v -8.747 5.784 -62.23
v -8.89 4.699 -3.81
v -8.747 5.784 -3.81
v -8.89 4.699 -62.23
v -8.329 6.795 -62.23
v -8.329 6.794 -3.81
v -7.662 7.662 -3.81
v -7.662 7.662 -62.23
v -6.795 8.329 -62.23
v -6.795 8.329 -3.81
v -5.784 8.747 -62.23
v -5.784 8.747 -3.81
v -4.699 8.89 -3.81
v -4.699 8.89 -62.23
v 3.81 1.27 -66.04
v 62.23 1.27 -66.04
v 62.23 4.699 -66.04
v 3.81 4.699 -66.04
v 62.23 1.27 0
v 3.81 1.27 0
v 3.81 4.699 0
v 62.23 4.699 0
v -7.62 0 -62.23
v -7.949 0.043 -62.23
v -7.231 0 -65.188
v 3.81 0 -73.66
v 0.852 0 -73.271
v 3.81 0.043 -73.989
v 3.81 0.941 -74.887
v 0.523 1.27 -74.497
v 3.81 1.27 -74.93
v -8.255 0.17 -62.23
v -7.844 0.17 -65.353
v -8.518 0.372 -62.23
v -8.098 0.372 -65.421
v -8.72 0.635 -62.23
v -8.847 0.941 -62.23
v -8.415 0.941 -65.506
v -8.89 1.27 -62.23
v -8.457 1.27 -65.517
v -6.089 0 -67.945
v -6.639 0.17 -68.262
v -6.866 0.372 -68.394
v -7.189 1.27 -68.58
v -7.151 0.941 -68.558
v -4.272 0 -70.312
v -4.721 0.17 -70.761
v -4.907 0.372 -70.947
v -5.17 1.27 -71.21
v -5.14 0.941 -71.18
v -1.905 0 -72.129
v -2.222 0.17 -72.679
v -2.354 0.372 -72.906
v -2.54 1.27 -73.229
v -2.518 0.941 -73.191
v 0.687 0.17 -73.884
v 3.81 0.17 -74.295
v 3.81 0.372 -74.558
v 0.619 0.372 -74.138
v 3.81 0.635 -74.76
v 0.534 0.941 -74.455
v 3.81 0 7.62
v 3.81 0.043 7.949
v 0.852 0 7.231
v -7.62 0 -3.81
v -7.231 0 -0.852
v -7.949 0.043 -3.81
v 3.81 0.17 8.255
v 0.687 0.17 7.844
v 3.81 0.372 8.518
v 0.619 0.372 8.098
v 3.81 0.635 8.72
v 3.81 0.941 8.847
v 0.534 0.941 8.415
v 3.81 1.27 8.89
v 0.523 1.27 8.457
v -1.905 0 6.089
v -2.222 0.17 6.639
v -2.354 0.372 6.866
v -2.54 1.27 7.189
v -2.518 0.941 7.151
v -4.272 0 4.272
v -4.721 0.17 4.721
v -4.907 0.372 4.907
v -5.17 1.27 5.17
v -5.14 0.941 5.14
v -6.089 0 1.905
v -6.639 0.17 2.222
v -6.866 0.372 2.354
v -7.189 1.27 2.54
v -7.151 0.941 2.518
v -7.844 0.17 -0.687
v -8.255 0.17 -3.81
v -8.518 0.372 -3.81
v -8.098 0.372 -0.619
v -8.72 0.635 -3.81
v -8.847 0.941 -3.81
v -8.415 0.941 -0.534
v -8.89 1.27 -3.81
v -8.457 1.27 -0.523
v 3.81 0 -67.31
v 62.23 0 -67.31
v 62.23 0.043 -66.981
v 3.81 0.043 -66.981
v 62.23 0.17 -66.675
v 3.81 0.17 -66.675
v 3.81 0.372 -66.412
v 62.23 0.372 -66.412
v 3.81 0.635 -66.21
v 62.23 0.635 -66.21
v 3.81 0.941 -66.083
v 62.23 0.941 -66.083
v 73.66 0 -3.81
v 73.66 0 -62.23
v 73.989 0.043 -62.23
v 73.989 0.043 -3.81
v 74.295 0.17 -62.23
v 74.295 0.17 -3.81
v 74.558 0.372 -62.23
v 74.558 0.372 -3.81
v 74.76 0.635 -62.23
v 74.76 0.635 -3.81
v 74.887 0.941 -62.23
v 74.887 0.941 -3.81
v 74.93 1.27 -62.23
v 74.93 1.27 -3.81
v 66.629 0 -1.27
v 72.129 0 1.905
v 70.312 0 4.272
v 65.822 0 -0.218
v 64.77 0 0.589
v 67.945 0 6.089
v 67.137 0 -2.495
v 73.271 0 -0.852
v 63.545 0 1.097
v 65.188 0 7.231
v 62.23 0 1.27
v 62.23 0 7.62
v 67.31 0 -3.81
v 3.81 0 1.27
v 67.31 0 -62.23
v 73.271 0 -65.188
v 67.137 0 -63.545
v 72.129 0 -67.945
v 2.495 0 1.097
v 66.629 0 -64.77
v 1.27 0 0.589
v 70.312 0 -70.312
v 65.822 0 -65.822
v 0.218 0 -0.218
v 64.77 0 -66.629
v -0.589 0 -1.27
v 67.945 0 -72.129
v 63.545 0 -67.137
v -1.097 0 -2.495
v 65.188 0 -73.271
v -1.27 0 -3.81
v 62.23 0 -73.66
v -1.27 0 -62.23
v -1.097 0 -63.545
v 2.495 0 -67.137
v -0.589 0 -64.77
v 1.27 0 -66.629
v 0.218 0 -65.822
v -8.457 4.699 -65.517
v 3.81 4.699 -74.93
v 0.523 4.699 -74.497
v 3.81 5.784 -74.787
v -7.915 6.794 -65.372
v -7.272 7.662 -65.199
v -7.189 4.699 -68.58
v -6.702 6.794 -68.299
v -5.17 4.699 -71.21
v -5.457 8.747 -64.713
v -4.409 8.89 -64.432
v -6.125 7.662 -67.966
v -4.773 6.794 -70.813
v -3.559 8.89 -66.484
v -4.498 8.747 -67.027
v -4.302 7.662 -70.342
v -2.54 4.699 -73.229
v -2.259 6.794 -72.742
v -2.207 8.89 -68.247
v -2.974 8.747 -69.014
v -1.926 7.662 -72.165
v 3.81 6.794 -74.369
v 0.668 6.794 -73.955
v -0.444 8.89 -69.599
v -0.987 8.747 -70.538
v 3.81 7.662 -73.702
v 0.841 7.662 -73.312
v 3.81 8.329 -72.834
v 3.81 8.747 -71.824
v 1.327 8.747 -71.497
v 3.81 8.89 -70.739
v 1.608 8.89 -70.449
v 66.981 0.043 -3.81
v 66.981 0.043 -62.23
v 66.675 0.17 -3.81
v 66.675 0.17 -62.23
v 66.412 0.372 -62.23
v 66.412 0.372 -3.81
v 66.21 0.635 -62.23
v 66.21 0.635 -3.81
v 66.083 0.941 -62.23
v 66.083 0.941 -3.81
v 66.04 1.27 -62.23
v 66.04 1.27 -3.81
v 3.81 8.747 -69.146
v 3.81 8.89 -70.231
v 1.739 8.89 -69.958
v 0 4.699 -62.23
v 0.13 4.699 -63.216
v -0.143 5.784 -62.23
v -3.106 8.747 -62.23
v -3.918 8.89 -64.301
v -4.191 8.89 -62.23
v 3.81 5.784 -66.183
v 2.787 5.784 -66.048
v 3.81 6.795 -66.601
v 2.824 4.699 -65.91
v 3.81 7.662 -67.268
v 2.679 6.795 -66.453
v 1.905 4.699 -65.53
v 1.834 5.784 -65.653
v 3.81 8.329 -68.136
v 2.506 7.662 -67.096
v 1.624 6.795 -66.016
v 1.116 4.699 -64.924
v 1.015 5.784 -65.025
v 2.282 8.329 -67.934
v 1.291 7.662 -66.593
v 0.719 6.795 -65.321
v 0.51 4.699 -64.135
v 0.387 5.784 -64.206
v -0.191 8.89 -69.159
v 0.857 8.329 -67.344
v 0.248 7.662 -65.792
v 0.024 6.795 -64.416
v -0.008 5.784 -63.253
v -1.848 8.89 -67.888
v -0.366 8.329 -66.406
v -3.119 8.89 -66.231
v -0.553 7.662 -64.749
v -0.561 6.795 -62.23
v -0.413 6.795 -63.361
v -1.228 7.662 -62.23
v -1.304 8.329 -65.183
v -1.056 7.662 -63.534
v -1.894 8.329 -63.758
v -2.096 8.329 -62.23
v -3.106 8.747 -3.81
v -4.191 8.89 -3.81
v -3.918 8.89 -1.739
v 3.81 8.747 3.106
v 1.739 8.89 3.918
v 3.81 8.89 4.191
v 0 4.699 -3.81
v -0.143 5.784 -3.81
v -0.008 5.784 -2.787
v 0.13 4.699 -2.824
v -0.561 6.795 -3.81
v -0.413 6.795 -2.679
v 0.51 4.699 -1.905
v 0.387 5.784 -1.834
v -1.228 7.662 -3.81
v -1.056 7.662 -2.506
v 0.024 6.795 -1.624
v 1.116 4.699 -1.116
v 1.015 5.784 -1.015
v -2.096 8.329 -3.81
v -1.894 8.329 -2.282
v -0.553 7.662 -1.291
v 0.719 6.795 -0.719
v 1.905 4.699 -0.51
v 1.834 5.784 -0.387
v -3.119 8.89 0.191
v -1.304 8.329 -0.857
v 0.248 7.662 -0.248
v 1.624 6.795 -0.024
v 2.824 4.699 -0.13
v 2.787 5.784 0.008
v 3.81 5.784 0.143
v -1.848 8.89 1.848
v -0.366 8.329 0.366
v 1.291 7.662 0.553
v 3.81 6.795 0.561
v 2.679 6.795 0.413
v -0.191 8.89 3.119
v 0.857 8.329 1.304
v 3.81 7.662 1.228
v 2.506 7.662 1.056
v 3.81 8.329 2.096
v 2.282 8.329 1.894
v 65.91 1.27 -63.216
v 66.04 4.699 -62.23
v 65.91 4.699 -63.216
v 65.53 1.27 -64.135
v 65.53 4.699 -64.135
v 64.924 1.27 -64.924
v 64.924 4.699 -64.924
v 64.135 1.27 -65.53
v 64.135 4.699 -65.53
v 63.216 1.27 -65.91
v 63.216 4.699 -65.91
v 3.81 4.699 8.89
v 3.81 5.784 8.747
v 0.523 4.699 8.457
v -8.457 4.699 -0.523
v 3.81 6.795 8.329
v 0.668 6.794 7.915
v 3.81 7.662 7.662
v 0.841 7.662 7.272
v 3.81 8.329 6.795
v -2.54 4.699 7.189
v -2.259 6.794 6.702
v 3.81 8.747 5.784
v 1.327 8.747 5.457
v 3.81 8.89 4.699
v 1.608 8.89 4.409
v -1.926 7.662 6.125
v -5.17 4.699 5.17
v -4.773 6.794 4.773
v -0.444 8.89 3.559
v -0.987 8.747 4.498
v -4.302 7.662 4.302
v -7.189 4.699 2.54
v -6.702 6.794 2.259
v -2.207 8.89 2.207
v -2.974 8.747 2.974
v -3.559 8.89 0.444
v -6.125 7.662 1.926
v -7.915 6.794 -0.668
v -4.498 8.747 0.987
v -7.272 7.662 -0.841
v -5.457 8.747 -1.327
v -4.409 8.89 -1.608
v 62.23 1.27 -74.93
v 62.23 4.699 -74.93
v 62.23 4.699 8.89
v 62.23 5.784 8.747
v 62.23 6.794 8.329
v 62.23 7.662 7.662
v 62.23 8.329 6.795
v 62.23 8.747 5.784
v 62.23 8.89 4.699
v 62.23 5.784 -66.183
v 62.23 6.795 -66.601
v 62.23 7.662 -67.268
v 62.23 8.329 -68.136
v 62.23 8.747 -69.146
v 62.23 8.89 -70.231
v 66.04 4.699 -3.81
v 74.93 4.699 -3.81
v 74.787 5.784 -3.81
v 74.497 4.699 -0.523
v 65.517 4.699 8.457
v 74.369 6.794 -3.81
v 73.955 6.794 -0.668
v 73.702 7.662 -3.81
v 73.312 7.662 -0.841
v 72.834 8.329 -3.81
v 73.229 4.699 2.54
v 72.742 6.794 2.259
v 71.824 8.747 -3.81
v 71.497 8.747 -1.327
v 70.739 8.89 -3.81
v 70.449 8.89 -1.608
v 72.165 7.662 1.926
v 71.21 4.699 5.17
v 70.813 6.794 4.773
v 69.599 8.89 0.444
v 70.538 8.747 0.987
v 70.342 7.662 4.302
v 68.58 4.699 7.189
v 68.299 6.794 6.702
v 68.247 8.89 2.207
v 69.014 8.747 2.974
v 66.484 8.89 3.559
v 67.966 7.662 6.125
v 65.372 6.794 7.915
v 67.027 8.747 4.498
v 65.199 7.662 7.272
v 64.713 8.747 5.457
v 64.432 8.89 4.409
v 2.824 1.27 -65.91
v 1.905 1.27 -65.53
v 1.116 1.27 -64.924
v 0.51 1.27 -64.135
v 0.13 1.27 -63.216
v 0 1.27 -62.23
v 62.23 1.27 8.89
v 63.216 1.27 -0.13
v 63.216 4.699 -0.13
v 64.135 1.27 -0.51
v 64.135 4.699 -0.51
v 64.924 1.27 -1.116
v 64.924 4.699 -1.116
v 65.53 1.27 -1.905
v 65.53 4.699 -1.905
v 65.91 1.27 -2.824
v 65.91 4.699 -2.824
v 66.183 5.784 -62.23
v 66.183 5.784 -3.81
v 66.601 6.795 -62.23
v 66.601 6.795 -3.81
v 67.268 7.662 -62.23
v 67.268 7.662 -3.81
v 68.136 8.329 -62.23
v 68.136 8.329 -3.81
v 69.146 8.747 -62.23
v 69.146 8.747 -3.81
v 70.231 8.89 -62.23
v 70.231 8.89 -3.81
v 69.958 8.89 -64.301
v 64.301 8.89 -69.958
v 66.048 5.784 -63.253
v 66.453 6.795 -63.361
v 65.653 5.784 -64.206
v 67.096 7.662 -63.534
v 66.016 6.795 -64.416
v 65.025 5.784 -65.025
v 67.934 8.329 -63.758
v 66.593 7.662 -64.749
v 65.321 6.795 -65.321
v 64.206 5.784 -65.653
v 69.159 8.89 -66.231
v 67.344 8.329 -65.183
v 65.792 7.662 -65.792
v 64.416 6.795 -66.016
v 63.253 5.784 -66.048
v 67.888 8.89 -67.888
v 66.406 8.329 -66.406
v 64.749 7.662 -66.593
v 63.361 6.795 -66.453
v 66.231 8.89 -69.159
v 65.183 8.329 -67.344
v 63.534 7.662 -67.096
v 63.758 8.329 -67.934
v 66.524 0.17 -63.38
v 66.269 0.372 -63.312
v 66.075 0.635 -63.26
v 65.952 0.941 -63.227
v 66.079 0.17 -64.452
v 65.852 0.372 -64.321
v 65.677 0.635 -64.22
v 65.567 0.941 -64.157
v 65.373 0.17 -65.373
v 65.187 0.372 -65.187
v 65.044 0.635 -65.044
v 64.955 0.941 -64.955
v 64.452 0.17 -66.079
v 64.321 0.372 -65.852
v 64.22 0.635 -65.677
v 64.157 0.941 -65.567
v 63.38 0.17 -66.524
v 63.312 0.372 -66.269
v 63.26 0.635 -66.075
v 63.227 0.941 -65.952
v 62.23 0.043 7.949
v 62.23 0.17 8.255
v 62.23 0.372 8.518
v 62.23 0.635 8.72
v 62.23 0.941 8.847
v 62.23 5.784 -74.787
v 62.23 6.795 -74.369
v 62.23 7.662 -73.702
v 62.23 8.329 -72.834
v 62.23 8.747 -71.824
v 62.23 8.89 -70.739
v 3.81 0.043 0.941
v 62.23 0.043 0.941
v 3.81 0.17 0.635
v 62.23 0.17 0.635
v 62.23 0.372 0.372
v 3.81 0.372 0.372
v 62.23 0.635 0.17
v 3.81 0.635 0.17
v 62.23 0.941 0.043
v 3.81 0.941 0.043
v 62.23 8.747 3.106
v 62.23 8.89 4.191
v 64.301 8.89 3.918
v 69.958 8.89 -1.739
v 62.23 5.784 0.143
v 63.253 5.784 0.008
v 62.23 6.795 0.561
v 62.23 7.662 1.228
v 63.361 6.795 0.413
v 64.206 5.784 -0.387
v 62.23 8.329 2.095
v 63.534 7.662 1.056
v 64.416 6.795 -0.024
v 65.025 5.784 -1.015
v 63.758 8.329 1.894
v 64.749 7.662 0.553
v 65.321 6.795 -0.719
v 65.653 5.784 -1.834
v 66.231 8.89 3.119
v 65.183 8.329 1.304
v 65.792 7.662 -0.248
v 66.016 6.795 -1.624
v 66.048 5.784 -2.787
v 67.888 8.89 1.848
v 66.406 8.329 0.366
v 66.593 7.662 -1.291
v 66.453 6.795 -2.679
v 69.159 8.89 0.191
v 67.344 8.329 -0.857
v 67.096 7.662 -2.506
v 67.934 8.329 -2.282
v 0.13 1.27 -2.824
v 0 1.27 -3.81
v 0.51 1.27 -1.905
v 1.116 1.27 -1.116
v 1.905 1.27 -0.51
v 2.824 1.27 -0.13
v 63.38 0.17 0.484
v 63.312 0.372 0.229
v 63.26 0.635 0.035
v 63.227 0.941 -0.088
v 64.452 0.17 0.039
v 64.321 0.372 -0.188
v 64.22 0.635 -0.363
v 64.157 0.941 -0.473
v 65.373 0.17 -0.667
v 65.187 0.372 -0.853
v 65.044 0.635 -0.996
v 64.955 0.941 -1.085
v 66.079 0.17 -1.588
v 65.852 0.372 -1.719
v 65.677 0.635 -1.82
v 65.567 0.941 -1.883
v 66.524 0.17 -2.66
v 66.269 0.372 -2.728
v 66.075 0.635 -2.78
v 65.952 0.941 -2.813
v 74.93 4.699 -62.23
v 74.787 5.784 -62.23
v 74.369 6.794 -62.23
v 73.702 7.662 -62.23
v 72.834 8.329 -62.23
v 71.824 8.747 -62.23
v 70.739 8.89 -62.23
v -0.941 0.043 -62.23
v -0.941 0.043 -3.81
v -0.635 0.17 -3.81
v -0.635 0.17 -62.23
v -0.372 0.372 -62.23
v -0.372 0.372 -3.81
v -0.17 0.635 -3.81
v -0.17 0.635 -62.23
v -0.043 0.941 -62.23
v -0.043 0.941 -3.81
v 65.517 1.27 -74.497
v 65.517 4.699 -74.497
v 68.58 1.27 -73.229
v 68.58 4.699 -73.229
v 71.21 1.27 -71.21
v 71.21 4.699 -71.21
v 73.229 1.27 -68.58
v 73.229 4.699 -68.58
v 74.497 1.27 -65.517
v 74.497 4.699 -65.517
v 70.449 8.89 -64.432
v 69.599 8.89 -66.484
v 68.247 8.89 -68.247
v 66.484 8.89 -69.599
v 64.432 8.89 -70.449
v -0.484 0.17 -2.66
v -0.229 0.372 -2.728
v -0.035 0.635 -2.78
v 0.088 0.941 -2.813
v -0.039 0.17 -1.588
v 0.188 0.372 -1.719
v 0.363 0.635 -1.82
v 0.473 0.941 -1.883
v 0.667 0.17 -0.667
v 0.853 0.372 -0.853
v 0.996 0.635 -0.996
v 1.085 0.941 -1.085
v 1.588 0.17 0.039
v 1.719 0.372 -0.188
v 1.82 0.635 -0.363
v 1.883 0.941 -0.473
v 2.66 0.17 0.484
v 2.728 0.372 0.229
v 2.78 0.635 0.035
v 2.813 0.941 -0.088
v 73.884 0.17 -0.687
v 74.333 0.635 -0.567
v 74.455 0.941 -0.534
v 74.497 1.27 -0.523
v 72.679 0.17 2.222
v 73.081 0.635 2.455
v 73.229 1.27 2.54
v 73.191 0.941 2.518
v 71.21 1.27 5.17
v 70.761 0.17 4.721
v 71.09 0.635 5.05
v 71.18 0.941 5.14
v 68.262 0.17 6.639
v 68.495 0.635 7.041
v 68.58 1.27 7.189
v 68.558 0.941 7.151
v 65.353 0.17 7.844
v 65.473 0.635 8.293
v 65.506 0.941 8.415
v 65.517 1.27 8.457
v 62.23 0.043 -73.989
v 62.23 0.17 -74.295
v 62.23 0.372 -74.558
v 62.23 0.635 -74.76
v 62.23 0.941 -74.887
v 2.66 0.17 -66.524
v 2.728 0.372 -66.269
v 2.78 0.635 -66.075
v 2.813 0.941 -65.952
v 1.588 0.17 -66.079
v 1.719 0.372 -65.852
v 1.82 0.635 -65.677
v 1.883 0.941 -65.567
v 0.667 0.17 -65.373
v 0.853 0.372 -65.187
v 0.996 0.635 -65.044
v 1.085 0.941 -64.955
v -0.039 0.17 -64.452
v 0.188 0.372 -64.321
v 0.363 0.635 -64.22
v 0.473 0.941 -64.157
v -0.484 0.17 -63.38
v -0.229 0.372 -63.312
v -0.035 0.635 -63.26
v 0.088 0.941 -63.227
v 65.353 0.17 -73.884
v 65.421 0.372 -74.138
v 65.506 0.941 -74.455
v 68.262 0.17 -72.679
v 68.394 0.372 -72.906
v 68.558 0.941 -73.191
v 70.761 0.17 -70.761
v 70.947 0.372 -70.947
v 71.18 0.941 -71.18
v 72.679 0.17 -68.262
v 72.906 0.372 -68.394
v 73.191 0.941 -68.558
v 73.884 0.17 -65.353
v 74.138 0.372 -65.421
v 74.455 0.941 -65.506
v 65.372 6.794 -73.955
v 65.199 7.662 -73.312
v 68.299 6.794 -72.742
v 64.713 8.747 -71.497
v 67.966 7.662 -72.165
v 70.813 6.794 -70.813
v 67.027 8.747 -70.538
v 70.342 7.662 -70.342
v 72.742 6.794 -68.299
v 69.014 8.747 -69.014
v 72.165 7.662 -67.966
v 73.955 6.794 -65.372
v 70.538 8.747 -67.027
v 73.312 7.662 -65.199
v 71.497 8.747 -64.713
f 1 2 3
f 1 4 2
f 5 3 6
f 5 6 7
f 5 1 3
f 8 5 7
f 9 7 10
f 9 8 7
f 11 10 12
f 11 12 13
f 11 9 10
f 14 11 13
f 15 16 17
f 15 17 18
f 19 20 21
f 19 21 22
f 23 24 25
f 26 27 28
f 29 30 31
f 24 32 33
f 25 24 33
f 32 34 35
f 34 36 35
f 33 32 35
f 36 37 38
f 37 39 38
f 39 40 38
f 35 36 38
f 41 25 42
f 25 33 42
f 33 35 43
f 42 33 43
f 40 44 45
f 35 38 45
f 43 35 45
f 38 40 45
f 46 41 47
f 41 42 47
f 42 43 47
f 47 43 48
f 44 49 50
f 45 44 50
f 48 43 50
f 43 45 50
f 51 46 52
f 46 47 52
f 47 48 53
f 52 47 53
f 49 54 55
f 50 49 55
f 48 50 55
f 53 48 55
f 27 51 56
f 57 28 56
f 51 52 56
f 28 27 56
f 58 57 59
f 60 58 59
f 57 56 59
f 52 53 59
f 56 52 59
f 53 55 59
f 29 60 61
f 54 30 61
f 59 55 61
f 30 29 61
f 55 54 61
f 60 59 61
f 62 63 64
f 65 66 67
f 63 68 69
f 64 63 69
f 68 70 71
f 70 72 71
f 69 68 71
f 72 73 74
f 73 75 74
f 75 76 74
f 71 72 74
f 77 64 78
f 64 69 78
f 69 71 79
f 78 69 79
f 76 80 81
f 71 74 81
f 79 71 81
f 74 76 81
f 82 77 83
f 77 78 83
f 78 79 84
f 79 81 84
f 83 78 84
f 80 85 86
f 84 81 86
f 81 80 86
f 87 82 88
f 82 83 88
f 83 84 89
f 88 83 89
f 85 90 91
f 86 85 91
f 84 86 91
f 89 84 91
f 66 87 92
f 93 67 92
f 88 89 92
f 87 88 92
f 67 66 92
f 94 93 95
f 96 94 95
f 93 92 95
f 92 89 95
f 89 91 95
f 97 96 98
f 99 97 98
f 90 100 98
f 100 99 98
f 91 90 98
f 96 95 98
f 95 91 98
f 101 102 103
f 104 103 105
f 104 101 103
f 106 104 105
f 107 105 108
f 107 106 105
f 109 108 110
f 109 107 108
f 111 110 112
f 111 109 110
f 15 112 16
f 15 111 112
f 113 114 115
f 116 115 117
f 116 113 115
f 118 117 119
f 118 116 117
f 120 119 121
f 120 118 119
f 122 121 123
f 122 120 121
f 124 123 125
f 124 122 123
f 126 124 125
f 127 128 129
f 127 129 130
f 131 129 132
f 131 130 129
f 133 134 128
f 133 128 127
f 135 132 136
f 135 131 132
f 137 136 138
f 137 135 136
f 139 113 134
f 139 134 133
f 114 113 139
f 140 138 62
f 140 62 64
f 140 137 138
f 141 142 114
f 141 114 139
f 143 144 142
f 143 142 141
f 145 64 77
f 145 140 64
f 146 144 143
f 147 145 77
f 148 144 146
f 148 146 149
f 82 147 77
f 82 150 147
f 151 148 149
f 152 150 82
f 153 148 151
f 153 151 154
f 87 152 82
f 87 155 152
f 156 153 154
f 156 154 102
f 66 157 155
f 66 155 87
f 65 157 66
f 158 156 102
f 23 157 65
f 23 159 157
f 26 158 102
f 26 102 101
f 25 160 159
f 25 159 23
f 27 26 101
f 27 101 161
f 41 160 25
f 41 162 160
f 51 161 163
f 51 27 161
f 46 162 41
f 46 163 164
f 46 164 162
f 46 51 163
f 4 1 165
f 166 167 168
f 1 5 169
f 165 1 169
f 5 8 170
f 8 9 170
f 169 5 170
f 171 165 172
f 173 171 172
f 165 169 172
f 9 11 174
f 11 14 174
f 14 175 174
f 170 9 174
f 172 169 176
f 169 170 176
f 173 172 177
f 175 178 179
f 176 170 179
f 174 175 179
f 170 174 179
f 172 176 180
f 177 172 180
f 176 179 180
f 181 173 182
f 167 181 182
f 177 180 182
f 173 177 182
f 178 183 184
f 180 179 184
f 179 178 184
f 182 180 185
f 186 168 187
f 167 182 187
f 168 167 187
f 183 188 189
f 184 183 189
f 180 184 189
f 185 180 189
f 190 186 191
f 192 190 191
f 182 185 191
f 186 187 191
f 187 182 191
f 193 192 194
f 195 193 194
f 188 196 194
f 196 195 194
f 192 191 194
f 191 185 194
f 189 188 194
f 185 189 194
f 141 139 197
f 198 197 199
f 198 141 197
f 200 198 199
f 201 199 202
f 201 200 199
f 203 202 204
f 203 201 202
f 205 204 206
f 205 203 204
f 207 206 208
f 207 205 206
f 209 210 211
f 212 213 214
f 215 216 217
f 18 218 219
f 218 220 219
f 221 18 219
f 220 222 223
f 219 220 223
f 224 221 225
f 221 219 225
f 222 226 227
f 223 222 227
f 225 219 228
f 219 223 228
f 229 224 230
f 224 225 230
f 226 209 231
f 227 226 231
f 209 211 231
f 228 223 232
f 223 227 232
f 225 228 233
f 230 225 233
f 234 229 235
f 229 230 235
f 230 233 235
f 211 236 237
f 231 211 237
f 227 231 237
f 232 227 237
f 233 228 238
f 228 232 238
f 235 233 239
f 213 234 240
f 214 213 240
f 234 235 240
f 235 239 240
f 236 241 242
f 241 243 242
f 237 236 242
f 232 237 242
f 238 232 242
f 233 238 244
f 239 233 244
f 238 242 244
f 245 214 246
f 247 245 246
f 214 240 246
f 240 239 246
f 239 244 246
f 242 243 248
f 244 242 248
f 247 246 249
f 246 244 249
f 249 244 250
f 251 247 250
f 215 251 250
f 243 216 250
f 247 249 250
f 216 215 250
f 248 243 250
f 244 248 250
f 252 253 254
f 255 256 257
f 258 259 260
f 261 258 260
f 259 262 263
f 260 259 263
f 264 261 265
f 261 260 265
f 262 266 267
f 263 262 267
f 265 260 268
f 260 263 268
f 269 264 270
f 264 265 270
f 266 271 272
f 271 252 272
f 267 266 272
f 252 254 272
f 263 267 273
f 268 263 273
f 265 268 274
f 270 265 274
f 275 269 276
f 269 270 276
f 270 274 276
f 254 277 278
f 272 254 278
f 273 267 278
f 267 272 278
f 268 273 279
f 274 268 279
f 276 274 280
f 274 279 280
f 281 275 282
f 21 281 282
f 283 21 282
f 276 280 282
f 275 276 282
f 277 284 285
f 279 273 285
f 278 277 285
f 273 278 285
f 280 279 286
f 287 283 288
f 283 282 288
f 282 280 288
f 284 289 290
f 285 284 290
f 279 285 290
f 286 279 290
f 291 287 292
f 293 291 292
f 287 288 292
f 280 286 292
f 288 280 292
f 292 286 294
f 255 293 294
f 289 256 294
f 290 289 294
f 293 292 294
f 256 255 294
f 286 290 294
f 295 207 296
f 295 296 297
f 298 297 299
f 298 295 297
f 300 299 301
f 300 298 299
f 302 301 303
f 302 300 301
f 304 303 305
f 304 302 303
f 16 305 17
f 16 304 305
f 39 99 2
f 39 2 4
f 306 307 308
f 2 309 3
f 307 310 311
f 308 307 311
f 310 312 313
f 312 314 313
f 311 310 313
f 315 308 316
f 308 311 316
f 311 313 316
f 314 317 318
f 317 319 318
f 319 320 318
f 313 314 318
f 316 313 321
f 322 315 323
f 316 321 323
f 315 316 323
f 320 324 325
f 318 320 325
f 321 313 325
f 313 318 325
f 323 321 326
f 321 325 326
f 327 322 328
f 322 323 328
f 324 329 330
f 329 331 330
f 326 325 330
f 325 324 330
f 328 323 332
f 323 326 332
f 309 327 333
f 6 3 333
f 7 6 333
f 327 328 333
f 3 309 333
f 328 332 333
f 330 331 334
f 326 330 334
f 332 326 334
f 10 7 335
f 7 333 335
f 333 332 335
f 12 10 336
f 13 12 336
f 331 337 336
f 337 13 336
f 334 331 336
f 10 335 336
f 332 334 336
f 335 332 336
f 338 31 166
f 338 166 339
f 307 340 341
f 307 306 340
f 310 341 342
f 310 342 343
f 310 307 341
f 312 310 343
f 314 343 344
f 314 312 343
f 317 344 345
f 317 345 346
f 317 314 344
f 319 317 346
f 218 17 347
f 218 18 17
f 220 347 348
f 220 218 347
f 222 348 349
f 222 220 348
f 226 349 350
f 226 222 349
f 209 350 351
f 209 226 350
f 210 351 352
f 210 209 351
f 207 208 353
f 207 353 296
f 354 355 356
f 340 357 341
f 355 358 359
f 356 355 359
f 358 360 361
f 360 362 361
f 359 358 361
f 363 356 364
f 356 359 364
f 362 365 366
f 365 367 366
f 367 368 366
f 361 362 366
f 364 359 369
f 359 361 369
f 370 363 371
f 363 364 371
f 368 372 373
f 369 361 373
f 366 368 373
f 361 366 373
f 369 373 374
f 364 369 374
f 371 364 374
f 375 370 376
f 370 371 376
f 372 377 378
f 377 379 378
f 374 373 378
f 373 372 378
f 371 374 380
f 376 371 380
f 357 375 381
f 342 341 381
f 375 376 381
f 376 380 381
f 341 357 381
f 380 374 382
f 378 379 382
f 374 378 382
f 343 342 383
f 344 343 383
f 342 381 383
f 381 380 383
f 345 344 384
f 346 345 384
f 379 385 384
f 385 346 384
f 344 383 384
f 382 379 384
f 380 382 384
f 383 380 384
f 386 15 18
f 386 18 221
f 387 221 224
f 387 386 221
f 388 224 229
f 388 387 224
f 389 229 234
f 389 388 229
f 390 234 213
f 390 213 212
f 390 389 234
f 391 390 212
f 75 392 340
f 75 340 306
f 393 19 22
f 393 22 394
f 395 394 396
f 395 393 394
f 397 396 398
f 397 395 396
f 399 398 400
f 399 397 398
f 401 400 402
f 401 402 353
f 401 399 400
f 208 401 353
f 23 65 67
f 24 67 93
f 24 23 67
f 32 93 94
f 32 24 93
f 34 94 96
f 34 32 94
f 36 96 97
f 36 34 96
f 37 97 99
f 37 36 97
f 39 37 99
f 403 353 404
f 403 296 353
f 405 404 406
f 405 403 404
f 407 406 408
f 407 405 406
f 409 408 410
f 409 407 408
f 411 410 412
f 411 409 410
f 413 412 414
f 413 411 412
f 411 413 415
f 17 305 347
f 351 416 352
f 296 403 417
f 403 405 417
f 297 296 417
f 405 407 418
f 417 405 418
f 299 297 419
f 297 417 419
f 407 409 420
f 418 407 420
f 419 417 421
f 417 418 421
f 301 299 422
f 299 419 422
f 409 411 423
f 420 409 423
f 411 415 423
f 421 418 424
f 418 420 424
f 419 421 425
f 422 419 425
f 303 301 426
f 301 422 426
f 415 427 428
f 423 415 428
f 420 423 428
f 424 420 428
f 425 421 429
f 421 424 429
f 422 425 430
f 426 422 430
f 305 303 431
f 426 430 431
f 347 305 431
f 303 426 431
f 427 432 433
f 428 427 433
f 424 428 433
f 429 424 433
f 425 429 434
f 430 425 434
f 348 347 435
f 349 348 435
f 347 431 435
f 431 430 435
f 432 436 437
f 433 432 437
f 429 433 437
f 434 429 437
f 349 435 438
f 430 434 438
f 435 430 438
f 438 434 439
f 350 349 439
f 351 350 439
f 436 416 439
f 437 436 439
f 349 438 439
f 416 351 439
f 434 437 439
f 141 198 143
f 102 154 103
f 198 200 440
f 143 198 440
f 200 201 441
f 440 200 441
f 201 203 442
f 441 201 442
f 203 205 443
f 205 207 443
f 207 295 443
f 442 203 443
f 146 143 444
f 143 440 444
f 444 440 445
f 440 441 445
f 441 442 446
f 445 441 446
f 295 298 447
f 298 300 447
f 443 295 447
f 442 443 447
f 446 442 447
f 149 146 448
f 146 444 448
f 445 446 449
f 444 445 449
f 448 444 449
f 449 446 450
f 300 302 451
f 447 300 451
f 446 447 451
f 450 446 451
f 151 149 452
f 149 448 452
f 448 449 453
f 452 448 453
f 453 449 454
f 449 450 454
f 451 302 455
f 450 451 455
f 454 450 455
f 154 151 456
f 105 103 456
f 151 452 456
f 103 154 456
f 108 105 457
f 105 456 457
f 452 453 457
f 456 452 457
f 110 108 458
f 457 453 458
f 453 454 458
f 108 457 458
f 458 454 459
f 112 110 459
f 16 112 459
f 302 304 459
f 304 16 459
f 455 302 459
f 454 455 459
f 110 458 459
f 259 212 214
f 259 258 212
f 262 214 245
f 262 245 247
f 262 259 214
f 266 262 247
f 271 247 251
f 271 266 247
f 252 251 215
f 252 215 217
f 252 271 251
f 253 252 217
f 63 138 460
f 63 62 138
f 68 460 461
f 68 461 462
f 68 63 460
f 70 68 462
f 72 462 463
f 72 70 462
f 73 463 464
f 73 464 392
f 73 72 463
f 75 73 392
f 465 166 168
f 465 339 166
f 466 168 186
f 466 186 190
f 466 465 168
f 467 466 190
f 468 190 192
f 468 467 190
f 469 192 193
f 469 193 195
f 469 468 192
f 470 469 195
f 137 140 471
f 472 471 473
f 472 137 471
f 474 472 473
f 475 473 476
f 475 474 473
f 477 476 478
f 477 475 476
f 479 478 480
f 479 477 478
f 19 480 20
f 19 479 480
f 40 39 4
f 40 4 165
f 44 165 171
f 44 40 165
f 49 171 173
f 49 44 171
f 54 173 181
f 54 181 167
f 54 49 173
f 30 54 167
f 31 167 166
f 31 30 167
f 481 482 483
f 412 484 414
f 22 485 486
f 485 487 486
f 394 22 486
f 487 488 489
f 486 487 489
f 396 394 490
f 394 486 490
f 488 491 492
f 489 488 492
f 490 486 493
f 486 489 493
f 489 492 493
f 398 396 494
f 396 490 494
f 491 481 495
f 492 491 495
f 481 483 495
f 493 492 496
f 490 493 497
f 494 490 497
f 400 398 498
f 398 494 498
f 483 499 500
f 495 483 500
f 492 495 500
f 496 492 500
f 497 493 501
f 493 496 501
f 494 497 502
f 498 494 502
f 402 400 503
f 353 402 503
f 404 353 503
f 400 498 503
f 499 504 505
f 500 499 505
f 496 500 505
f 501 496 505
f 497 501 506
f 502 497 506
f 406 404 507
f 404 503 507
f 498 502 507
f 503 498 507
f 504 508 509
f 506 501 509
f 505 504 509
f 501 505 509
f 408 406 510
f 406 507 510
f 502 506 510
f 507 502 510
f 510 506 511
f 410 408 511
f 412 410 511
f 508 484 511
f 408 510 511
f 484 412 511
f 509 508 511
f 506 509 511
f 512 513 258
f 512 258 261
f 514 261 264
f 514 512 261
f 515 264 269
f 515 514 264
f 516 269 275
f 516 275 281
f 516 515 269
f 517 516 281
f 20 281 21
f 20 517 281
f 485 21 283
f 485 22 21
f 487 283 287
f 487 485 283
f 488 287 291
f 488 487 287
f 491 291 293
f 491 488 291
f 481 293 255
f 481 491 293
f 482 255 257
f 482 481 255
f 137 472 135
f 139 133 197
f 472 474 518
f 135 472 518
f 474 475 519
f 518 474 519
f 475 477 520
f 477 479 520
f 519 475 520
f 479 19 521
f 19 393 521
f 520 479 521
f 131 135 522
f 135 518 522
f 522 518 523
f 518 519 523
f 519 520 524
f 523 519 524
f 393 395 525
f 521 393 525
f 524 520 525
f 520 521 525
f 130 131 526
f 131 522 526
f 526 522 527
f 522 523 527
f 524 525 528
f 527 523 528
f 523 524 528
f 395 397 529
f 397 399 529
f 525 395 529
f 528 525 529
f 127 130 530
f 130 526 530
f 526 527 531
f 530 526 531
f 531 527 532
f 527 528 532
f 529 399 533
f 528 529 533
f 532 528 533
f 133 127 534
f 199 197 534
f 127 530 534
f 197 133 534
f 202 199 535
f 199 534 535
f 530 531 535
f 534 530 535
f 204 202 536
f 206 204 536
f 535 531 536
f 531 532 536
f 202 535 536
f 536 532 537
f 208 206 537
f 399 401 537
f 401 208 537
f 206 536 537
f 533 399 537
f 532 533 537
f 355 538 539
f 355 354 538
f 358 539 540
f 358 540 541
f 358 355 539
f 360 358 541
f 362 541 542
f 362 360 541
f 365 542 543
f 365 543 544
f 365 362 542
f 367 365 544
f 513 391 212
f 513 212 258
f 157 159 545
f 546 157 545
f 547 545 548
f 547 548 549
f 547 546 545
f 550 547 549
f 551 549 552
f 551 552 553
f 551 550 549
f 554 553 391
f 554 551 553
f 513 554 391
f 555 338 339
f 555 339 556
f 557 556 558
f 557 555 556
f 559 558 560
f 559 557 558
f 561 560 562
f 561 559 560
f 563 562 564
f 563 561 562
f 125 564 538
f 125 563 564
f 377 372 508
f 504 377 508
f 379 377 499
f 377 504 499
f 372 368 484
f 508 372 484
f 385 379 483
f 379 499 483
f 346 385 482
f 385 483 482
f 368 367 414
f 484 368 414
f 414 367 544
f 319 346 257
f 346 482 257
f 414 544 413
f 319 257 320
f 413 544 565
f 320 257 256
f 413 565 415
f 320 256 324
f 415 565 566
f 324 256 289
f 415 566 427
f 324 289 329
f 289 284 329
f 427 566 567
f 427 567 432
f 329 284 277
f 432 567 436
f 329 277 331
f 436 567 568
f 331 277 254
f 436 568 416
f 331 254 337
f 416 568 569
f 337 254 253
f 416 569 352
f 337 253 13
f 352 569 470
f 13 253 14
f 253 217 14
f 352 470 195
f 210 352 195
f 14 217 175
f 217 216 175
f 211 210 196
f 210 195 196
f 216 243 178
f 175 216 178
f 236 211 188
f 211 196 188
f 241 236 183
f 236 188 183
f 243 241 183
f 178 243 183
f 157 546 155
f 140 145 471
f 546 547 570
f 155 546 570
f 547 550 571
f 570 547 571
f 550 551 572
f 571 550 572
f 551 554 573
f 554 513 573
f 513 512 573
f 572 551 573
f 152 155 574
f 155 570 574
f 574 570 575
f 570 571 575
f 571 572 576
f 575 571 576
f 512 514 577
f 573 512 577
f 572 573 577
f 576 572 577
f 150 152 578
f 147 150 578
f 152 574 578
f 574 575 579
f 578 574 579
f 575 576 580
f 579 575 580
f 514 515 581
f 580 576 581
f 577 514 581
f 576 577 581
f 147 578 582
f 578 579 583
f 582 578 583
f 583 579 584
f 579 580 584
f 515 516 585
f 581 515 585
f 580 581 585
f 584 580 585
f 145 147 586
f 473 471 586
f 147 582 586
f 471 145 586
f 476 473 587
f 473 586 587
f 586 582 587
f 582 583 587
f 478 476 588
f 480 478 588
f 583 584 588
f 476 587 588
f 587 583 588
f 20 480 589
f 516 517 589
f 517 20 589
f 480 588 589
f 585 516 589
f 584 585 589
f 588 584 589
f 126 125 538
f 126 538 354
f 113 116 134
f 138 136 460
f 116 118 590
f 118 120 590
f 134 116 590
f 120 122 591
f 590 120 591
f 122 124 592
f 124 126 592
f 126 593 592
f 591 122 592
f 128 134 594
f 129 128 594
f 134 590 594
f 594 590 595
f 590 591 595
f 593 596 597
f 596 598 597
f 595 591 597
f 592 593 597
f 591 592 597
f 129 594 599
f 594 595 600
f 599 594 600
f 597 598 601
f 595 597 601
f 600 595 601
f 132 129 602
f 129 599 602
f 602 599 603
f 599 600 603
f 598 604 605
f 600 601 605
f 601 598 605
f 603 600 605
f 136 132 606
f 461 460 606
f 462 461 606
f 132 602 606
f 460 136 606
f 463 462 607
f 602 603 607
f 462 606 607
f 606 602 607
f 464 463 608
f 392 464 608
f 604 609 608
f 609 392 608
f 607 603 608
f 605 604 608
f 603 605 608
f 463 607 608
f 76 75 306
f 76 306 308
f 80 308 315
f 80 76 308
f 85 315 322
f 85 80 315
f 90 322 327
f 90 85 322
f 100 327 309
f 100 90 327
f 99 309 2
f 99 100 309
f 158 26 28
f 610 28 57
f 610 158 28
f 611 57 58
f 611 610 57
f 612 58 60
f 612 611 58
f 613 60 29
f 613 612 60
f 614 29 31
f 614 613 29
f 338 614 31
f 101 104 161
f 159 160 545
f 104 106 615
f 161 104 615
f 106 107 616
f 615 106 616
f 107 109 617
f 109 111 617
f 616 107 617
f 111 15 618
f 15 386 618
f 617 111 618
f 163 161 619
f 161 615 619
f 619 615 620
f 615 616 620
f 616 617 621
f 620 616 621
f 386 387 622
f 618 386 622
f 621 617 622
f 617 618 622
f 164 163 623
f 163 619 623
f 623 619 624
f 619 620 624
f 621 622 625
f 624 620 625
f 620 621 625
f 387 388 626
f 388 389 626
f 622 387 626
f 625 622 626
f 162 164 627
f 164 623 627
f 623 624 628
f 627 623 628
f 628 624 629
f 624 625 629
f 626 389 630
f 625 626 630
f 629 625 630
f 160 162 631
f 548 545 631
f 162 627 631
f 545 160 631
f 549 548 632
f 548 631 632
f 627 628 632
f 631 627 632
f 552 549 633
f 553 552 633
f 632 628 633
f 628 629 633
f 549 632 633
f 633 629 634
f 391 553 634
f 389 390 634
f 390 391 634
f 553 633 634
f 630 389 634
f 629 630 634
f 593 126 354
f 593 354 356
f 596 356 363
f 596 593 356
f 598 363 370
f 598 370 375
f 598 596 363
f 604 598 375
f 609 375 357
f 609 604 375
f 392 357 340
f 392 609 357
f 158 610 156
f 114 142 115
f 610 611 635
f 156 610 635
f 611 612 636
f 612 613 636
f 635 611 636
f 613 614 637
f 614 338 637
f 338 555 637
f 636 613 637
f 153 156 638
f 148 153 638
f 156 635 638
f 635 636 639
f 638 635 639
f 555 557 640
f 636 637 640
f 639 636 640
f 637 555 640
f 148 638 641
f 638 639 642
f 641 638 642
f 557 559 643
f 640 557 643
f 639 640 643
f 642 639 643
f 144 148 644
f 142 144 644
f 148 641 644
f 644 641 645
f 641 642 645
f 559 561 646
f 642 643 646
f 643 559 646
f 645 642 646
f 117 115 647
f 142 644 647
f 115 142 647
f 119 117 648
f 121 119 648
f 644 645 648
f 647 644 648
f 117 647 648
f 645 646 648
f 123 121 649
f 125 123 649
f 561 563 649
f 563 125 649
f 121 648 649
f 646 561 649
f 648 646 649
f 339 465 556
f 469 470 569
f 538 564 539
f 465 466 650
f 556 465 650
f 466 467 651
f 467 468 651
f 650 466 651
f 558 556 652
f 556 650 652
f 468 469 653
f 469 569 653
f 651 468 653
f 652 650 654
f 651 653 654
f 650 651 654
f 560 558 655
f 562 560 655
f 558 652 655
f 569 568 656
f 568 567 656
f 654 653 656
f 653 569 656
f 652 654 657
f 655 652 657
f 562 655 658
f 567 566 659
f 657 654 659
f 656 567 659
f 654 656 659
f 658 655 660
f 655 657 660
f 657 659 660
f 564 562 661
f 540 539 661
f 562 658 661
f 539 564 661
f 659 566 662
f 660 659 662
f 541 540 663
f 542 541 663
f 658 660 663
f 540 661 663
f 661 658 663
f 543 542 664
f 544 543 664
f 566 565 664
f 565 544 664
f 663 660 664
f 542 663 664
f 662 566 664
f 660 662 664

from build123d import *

# Parameters (mm, degrees)
BOSS_EXTRUDE1_DEPTH = 8.89
FILLET1_R           = 4.191
FILLET2_R           = 1.27


with BuildPart() as part:
    # Sketch1 → Boss-Extrude1 (new body)
    with BuildSketch(Plane(origin=(0, 0, 0), x_dir=(1, 0, 0), z_dir=(0, 1, 0))):
        with BuildLine():
            Line((-8.89, 3.81), (-8.89, 62.23))
            ThreePointArc((-8.89, 62.23), (-5.170256121, 71.210256121), (3.81, 74.93))
            Line((3.81, 74.93), (62.23, 74.93))
            ThreePointArc((62.23, 74.93), (71.210256121, 71.210256121), (74.93, 62.23))
            Line((74.93, 62.23), (74.93, 3.81))
            ThreePointArc((74.93, 3.81), (71.210256121, -5.170256121), (62.23, -8.89))
            Line((62.23, -8.89), (3.81, -8.89))
            ThreePointArc((3.81, -8.89), (-5.170256121, -5.170256121), (-8.89, 3.81))
        make_face()
        with BuildLine():
            Line((3.81, 0), (62.23, 0))
            ThreePointArc((62.23, 0), (64.924076836, 1.115923164), (66.04, 3.81))
            Line((66.04, 3.81), (66.04, 62.23))
            ThreePointArc((66.04, 62.23), (64.924076836, 64.924076836), (62.23, 66.04))
            Line((62.23, 66.04), (3.81, 66.04))
            ThreePointArc((3.81, 66.04), (1.115923164, 64.924076836), (0, 62.23))
            Line((0, 62.23), (0, 3.81))
            ThreePointArc((0, 3.81), (1.115923164, 1.115923164), (3.81, 0))
        make_face(mode=Mode.SUBTRACT)
    extrude(amount=BOSS_EXTRUDE1_DEPTH)

    # Fillet1
    fillet1_edges = [part.edges().sort_by_distance(p)[0] for p in [
        (71.210256121, 8.89, 5.170256121),
        (74.93, 8.89, -33.02),
        (71.210256121, 8.89, -71.210256121),
        (33.02, 8.89, -74.93),
        (-5.170256121, 8.89, -71.210256121),
        (-8.89, 8.89, -33.02),
        (1.115923164, 8.89, -1.115923164),
        (33.02, 8.89, 0),
        (64.924076836, 8.89, -1.115923164),
        (66.04, 8.89, -33.02),
        (64.924076836, 8.89, -64.924076836),
        (33.02, 8.89, -66.04),
        (1.115923164, 8.89, -64.924076836),
        (0, 8.89, -33.02),
        (-5.170256121, 8.89, 5.170256121),
        (33.02, 8.89, 8.89),
    ]]
    fillet(fillet1_edges, radius=FILLET1_R)

    # Fillet2
    fillet2_edges = [part.edges().sort_by_distance(p)[0] for p in [
        (33.02, 0, 8.89),
        (-5.170256121, 0, 5.170256121),
        (1.115923164, 0, -1.115923164),
        (33.02, 0, 0),
        (64.924076836, 0, -1.115923164),
        (66.04, 0, -33.02),
        (64.924076836, 0, -64.924076836),
        (33.02, 0, -66.04),
        (1.115923164, 0, -64.924076836),
        (0, 0, -33.02),
        (-8.89, 0, -33.02),
        (-5.170256121, 0, -71.210256121),
        (33.02, 0, -74.93),
        (71.210256121, 0, -71.210256121),
        (74.93, 0, -33.02),
        (71.210256121, 0, 5.170256121),
    ]]
    fillet(fillet2_edges, radius=FILLET2_R)


solid = part.part
